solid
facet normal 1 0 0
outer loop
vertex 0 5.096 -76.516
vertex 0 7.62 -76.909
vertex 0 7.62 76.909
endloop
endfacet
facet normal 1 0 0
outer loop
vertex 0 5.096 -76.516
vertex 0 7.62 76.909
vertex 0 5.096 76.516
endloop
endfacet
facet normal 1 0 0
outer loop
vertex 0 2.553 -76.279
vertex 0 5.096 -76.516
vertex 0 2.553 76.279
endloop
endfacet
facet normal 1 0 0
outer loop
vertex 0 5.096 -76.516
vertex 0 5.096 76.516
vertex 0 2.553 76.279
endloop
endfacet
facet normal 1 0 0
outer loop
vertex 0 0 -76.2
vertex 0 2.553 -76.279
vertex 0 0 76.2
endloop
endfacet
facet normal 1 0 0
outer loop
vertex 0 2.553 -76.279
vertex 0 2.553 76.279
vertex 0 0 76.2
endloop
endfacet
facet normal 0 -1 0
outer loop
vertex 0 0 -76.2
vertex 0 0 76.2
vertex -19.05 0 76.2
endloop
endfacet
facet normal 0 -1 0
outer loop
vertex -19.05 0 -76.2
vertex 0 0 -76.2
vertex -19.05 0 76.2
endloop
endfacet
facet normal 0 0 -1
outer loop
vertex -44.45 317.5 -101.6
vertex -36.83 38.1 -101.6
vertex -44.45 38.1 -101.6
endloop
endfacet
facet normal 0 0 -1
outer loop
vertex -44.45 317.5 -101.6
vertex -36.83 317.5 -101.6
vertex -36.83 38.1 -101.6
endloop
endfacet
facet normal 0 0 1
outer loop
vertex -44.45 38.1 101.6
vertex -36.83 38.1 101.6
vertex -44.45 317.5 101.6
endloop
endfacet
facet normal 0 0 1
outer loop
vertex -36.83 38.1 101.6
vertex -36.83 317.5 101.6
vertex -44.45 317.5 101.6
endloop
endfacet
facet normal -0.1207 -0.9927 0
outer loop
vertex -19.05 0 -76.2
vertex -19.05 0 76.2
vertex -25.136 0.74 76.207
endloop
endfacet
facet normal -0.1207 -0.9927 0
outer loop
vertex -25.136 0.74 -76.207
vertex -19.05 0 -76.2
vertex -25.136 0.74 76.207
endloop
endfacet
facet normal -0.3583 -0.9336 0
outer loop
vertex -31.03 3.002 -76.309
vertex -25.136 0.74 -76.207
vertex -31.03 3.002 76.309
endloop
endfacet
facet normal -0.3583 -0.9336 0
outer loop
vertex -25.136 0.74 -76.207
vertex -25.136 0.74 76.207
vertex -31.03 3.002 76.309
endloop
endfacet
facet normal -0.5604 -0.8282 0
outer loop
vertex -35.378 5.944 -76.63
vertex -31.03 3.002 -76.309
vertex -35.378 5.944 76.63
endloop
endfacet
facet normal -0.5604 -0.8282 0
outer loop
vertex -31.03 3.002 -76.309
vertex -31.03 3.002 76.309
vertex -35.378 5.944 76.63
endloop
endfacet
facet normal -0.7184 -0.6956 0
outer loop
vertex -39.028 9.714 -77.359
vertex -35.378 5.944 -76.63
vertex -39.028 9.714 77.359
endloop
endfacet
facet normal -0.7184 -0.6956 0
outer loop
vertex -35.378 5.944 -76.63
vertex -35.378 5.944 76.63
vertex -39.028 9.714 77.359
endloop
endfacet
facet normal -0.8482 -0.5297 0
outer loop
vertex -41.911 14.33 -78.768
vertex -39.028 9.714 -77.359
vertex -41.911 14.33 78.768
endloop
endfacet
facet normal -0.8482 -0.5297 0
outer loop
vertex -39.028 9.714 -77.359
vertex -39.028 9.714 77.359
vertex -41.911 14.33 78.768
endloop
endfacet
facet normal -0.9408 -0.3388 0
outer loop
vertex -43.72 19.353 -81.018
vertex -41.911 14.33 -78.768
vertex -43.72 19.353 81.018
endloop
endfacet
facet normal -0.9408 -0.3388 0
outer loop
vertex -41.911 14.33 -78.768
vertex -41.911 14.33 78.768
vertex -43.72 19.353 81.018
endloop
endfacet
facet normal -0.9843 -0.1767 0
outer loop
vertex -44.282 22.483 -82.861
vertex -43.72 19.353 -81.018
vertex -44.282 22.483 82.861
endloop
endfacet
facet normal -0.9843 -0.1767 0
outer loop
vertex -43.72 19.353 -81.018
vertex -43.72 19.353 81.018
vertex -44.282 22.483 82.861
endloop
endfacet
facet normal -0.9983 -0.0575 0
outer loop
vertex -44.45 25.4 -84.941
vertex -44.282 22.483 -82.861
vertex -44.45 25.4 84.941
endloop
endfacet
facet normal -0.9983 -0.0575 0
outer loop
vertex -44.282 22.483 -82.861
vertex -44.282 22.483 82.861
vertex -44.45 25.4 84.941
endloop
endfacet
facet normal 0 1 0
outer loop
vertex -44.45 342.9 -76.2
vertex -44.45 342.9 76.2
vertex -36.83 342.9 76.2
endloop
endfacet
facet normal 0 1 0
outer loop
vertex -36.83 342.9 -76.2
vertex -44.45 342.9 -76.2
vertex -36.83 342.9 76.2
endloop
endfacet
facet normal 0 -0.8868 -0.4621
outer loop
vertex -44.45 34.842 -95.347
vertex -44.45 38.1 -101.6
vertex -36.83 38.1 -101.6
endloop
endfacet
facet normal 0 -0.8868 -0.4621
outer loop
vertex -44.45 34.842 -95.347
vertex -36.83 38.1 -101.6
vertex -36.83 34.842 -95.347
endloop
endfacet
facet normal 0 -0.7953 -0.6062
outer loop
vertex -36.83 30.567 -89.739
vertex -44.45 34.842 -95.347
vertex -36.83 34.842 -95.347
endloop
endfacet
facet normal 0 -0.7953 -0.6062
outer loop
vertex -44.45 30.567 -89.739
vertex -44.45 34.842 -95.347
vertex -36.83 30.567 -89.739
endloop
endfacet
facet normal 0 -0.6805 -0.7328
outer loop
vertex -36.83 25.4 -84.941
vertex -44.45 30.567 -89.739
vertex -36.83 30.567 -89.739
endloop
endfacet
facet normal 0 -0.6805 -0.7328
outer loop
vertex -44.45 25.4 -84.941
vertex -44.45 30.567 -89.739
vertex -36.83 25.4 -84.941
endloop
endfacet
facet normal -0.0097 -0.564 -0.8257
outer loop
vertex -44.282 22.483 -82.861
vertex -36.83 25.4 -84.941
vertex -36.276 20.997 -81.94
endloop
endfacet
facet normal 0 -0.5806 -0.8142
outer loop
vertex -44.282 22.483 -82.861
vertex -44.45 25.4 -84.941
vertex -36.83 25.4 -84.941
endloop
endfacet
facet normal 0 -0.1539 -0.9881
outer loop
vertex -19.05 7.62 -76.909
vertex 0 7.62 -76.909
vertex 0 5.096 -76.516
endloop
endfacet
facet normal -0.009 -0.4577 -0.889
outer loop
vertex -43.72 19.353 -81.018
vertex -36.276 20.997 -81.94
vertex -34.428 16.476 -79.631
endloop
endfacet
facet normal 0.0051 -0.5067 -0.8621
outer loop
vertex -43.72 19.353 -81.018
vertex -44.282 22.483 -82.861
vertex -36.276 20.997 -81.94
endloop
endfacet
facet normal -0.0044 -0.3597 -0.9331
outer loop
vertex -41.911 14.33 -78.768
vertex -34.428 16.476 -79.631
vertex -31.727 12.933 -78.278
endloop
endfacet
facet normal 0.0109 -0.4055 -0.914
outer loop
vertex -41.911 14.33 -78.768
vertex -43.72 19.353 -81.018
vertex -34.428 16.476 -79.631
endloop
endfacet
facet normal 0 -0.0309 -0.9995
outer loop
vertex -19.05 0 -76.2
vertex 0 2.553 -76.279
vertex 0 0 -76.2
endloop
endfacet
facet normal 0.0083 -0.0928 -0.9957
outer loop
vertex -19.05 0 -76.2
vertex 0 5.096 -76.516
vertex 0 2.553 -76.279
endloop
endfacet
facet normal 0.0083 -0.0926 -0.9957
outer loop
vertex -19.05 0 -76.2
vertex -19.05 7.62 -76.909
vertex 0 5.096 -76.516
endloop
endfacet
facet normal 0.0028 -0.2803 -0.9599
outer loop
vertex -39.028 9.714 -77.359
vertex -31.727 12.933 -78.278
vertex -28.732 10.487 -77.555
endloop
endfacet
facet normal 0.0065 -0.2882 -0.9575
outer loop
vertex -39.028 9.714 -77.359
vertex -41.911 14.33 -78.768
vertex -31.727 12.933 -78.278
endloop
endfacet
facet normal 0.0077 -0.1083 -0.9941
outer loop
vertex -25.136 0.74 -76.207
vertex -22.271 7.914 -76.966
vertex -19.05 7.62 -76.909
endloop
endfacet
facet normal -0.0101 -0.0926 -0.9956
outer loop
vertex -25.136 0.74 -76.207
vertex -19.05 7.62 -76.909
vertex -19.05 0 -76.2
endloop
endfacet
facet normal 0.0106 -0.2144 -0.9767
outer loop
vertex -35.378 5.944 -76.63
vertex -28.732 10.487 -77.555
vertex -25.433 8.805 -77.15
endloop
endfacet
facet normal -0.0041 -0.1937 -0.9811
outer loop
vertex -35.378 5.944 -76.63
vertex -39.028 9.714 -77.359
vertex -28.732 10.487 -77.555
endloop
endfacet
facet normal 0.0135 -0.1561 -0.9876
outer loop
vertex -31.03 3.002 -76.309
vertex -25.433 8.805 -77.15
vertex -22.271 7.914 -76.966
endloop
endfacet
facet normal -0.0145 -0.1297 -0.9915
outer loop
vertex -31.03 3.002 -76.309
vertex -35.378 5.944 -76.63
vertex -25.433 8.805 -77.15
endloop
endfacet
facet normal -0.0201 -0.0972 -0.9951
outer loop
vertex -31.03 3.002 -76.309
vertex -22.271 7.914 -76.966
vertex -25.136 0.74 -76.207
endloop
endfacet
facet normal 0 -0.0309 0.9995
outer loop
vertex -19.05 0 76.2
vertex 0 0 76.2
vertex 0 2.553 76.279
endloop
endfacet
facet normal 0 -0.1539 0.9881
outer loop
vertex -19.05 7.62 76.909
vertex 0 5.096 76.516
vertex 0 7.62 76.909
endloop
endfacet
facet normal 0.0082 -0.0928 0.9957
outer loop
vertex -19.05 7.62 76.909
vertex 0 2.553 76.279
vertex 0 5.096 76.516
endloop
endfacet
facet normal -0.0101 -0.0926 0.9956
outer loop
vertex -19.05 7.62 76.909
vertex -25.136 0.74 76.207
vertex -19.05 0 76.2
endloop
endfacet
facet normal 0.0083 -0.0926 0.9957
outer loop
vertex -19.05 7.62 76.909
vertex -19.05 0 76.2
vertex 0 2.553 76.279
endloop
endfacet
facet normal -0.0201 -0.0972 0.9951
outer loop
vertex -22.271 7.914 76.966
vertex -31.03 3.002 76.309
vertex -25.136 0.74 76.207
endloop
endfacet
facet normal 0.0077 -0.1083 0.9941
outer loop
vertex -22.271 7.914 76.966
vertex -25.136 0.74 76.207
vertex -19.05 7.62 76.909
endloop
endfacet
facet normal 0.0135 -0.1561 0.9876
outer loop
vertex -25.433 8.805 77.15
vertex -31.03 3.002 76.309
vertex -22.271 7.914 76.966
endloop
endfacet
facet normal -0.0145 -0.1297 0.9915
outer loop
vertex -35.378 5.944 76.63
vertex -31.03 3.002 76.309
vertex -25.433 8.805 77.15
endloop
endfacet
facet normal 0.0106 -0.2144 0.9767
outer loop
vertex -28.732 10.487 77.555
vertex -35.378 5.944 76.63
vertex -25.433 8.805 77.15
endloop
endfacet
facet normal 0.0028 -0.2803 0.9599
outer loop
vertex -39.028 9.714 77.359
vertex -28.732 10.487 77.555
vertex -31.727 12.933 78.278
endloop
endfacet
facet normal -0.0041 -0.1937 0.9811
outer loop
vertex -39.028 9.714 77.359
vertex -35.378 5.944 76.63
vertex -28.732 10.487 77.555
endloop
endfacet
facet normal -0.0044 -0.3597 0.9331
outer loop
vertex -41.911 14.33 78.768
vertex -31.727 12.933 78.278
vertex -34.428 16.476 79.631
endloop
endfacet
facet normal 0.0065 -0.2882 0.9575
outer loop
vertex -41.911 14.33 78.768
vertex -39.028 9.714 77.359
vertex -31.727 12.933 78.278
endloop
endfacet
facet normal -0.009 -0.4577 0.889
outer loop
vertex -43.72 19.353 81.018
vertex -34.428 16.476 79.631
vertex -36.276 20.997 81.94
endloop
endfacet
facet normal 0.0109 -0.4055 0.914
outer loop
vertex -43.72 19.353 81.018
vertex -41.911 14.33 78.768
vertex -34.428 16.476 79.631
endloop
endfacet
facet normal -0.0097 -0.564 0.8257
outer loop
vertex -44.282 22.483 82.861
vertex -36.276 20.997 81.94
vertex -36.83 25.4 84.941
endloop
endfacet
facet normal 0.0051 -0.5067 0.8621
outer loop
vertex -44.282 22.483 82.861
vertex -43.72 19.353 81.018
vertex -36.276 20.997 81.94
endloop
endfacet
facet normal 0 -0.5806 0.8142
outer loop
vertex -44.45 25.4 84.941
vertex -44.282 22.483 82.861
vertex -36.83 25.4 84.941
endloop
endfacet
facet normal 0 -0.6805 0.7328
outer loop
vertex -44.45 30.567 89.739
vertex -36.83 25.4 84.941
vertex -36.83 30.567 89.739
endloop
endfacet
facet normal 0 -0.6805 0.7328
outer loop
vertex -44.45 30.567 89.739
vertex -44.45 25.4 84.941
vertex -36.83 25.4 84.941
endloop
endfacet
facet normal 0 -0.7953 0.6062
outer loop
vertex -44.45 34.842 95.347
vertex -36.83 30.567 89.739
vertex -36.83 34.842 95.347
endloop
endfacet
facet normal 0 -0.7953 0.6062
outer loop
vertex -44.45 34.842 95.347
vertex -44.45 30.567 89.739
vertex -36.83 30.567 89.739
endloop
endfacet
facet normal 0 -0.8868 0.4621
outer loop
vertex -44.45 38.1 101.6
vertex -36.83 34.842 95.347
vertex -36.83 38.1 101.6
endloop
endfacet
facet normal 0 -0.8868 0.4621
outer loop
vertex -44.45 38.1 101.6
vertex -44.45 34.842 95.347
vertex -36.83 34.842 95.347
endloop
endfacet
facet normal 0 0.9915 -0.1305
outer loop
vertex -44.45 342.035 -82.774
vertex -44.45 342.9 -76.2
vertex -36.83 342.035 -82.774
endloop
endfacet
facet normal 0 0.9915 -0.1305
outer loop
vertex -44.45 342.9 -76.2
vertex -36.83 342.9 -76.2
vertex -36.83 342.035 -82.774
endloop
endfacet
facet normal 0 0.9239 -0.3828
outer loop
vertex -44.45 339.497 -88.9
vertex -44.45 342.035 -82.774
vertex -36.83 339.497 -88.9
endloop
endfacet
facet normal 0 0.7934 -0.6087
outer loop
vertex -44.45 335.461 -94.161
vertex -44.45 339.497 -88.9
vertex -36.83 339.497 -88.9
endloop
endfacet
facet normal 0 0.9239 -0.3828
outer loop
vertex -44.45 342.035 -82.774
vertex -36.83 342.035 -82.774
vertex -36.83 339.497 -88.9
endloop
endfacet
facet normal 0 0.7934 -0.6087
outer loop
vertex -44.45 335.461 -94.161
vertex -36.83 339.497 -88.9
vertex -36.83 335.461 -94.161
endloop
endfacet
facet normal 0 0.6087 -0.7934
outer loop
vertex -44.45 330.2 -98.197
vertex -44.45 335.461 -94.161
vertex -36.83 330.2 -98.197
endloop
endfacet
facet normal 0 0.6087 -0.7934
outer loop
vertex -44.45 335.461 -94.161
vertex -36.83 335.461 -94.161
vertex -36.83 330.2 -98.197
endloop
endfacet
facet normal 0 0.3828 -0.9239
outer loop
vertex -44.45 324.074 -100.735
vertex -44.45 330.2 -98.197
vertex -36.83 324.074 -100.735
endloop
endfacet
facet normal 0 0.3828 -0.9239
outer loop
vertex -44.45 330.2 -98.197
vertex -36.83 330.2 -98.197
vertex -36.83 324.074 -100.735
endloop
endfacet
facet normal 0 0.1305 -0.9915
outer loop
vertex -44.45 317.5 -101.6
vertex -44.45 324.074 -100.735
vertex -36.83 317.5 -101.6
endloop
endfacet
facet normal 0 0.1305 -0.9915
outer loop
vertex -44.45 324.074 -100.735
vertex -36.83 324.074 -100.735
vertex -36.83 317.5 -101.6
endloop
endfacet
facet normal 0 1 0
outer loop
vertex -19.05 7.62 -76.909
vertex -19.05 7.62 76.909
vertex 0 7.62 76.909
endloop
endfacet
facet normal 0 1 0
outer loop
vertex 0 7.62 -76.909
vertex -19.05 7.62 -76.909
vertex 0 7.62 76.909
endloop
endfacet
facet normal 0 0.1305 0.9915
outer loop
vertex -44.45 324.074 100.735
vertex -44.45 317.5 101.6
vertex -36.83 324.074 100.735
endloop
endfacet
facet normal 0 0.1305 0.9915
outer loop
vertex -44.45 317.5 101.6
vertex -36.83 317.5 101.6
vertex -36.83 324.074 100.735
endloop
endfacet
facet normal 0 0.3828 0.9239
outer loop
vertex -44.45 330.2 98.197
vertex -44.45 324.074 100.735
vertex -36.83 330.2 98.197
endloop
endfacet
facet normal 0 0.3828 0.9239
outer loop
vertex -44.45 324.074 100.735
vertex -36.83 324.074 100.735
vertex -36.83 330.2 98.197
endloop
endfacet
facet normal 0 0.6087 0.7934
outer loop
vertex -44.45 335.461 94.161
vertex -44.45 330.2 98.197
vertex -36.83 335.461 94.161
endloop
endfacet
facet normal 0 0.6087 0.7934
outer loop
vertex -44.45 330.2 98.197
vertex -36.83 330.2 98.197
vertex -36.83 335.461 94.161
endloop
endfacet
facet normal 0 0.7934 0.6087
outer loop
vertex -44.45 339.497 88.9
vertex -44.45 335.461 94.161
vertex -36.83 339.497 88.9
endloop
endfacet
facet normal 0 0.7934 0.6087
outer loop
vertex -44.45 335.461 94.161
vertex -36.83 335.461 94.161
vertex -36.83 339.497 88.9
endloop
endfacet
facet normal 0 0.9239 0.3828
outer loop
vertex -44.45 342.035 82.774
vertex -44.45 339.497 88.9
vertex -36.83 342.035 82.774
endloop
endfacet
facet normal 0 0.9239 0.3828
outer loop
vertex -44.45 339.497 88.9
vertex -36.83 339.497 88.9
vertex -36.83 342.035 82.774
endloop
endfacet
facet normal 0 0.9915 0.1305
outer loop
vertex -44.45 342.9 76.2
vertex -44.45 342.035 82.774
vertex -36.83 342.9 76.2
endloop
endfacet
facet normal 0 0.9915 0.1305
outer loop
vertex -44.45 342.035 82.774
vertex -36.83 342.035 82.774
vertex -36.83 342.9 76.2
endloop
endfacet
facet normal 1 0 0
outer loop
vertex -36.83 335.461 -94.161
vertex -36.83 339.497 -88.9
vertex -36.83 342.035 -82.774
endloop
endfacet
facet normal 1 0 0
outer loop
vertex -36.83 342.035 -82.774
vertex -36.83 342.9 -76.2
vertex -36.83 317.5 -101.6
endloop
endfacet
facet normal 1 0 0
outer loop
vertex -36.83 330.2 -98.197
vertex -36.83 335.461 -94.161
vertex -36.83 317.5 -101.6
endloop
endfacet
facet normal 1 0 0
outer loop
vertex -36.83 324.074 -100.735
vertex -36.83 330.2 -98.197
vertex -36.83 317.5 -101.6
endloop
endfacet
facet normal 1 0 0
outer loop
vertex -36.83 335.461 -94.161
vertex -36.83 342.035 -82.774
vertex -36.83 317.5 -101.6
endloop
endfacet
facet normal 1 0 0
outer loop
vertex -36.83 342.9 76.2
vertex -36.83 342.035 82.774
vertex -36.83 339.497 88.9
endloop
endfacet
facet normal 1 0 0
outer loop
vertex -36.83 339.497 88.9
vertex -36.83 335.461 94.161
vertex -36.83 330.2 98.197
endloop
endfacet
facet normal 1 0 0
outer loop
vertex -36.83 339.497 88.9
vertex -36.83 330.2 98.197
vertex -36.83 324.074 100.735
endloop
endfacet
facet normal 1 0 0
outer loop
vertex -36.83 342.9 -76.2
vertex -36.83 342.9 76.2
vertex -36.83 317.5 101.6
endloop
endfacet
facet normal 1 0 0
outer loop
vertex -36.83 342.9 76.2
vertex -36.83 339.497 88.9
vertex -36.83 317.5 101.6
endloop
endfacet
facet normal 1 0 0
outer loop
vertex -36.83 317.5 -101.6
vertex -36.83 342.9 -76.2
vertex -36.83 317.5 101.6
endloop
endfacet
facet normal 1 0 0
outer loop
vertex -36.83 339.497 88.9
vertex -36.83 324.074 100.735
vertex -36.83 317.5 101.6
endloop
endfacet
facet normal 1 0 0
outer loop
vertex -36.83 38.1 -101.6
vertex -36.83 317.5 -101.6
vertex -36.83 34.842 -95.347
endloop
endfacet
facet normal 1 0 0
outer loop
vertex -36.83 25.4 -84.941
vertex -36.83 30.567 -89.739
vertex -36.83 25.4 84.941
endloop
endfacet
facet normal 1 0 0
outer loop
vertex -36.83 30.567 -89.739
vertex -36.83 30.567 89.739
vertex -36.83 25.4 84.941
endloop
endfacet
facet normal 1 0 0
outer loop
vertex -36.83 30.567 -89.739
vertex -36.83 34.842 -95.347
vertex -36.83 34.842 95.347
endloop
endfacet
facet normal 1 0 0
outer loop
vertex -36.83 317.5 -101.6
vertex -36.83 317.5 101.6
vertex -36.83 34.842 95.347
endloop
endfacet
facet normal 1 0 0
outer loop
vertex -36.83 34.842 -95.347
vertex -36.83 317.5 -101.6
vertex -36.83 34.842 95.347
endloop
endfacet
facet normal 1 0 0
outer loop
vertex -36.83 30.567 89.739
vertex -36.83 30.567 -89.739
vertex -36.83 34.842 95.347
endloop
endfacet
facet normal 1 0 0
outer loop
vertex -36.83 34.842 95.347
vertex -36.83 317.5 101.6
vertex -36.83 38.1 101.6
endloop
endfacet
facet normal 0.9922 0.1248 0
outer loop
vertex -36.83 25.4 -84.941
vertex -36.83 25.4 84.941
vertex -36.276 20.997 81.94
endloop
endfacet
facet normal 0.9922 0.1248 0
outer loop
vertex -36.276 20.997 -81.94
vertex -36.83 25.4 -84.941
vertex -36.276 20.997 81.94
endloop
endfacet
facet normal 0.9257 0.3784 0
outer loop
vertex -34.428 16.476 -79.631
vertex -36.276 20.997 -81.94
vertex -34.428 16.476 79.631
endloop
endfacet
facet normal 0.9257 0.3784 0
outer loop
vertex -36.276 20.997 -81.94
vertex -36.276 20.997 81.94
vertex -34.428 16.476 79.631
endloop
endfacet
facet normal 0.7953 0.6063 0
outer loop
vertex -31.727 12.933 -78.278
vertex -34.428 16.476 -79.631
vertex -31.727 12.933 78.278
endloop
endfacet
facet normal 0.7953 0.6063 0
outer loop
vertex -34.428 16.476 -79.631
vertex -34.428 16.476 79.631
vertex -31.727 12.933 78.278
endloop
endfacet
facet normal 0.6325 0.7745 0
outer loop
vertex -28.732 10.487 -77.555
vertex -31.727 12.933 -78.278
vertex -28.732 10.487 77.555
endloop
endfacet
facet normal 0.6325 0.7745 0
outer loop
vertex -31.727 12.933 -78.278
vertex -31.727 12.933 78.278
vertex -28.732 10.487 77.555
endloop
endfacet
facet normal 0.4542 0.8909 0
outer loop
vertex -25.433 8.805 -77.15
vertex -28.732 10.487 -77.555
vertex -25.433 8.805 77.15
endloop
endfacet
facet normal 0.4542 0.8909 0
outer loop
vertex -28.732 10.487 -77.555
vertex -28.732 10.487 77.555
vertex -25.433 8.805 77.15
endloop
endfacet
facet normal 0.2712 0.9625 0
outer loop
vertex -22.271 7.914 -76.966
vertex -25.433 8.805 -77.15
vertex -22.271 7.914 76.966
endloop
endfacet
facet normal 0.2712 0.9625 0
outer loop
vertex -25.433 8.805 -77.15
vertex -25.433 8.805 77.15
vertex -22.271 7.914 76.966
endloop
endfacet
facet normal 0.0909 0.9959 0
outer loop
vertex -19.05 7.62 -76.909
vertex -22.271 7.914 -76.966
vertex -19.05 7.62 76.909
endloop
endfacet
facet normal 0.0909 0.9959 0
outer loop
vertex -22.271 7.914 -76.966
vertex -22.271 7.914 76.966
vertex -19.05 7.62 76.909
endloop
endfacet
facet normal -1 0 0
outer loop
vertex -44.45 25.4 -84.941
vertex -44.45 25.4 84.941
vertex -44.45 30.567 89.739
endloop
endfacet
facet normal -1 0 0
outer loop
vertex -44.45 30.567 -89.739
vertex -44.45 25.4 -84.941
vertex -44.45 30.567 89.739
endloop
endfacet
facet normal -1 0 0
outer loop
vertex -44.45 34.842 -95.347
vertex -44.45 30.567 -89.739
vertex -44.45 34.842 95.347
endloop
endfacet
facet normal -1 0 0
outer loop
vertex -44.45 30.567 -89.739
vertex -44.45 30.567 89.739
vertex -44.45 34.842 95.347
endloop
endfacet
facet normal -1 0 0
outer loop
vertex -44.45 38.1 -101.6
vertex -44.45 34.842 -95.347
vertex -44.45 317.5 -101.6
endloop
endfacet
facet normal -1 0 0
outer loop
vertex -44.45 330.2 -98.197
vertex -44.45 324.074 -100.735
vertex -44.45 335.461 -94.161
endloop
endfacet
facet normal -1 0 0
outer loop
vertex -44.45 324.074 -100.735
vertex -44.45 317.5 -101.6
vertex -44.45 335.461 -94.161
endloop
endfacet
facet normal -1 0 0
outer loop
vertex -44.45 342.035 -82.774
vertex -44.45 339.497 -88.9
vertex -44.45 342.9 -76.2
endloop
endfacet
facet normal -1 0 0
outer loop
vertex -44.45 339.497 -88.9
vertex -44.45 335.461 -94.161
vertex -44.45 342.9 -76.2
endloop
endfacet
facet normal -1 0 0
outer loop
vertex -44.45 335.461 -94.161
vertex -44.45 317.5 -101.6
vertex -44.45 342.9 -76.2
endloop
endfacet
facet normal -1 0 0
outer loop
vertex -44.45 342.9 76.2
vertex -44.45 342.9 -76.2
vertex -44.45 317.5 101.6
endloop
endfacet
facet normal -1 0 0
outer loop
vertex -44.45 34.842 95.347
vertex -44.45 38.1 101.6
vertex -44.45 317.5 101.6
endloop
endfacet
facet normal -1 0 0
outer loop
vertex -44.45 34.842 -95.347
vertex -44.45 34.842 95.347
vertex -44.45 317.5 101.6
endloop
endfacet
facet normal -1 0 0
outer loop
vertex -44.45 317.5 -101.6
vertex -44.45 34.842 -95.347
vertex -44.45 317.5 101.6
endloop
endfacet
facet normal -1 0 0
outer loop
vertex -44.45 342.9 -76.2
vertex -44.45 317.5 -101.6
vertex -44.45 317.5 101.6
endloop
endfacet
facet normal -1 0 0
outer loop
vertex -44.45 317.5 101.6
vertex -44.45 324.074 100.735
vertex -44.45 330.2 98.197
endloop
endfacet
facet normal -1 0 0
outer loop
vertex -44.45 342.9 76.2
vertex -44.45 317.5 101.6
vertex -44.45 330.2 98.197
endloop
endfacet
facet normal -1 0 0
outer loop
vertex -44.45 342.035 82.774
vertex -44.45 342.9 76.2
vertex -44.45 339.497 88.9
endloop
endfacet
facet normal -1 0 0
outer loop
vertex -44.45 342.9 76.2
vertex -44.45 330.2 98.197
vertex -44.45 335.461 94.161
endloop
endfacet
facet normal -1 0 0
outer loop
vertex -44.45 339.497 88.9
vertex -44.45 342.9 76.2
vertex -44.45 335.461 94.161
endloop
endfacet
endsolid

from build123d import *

# Parameters (mm, degrees)
EXTRUDE_THIN1_DEPTH     = 101.6
FILLET1_R               = 25.4
FILLET2_R               = 25.4
CUT_EXTRUDE1_DEPTH      = 15.494
CUT_EXTRUDE1_DEPTH_BACK = 67.818


with BuildPart() as part:
    # Sketch1 → Extrude-Thin1 (new, symmetric)
    with BuildSketch(Plane.XY):
        with BuildLine():
            Line((0, 0), (-19.05, 0))
            ThreePointArc((-19.05, 0), (-37.010512242, 7.439487758), (-44.45, 25.4))
            Line((-44.45, 25.4), (-44.45, 342.9))
            Line((-44.45, 342.9), (-36.83, 342.9))
            Line((-36.83, 342.9), (-36.83, 25.4))
            ThreePointArc((-36.83, 25.4), (-31.622358569, 12.827641431), (-19.05, 7.62))
            Line((-19.05, 7.62), (0, 7.62))
            Line((0, 7.62), (0, 0))
        make_face()
    extrude(amount=EXTRUDE_THIN1_DEPTH, both=True)

    # Fillet1
    fillet1_edges = [part.edges().sort_by_distance(p)[0] for p in [
        (-40.64, 342.9, 101.6),
    ]]
    fillet(fillet1_edges, radius=FILLET1_R)

    # Fillet2
    fillet2_edges = [part.edges().sort_by_distance(p)[0] for p in [
        (-40.64, 342.9, -101.6),
    ]]
    fillet(fillet2_edges, radius=FILLET2_R)

    # Sketch2 → Cut-Extrude1 (cut, two sides: drawn at the far end of the back side and taken through both)
    with BuildSketch(Plane(origin=(0, 0, 0), x_dir=(0, 0, -1), z_dir=(1, 0, 0)).offset(-CUT_EXTRUDE1_DEPTH_BACK)):
        with BuildLine():
            Line((-101.6, 0), (-76.2, 0))
            ThreePointArc((-76.2, 0), (-83.132124101, 22.895250599), (-101.6, 38.1))
            Line((-101.6, 38.1), (-101.6, 0))
        make_face()
        with BuildLine():
            Line((101.6, 0), (101.6, 38.1))
            ThreePointArc((101.6, 38.1), (83.132124101, 22.895250599), (76.2, 0))
            Line((76.2, 0), (101.6, 0))
        make_face()
    extrude(amount=CUT_EXTRUDE1_DEPTH + CUT_EXTRUDE1_DEPTH_BACK, mode=Mode.SUBTRACT)


solid = part.part
